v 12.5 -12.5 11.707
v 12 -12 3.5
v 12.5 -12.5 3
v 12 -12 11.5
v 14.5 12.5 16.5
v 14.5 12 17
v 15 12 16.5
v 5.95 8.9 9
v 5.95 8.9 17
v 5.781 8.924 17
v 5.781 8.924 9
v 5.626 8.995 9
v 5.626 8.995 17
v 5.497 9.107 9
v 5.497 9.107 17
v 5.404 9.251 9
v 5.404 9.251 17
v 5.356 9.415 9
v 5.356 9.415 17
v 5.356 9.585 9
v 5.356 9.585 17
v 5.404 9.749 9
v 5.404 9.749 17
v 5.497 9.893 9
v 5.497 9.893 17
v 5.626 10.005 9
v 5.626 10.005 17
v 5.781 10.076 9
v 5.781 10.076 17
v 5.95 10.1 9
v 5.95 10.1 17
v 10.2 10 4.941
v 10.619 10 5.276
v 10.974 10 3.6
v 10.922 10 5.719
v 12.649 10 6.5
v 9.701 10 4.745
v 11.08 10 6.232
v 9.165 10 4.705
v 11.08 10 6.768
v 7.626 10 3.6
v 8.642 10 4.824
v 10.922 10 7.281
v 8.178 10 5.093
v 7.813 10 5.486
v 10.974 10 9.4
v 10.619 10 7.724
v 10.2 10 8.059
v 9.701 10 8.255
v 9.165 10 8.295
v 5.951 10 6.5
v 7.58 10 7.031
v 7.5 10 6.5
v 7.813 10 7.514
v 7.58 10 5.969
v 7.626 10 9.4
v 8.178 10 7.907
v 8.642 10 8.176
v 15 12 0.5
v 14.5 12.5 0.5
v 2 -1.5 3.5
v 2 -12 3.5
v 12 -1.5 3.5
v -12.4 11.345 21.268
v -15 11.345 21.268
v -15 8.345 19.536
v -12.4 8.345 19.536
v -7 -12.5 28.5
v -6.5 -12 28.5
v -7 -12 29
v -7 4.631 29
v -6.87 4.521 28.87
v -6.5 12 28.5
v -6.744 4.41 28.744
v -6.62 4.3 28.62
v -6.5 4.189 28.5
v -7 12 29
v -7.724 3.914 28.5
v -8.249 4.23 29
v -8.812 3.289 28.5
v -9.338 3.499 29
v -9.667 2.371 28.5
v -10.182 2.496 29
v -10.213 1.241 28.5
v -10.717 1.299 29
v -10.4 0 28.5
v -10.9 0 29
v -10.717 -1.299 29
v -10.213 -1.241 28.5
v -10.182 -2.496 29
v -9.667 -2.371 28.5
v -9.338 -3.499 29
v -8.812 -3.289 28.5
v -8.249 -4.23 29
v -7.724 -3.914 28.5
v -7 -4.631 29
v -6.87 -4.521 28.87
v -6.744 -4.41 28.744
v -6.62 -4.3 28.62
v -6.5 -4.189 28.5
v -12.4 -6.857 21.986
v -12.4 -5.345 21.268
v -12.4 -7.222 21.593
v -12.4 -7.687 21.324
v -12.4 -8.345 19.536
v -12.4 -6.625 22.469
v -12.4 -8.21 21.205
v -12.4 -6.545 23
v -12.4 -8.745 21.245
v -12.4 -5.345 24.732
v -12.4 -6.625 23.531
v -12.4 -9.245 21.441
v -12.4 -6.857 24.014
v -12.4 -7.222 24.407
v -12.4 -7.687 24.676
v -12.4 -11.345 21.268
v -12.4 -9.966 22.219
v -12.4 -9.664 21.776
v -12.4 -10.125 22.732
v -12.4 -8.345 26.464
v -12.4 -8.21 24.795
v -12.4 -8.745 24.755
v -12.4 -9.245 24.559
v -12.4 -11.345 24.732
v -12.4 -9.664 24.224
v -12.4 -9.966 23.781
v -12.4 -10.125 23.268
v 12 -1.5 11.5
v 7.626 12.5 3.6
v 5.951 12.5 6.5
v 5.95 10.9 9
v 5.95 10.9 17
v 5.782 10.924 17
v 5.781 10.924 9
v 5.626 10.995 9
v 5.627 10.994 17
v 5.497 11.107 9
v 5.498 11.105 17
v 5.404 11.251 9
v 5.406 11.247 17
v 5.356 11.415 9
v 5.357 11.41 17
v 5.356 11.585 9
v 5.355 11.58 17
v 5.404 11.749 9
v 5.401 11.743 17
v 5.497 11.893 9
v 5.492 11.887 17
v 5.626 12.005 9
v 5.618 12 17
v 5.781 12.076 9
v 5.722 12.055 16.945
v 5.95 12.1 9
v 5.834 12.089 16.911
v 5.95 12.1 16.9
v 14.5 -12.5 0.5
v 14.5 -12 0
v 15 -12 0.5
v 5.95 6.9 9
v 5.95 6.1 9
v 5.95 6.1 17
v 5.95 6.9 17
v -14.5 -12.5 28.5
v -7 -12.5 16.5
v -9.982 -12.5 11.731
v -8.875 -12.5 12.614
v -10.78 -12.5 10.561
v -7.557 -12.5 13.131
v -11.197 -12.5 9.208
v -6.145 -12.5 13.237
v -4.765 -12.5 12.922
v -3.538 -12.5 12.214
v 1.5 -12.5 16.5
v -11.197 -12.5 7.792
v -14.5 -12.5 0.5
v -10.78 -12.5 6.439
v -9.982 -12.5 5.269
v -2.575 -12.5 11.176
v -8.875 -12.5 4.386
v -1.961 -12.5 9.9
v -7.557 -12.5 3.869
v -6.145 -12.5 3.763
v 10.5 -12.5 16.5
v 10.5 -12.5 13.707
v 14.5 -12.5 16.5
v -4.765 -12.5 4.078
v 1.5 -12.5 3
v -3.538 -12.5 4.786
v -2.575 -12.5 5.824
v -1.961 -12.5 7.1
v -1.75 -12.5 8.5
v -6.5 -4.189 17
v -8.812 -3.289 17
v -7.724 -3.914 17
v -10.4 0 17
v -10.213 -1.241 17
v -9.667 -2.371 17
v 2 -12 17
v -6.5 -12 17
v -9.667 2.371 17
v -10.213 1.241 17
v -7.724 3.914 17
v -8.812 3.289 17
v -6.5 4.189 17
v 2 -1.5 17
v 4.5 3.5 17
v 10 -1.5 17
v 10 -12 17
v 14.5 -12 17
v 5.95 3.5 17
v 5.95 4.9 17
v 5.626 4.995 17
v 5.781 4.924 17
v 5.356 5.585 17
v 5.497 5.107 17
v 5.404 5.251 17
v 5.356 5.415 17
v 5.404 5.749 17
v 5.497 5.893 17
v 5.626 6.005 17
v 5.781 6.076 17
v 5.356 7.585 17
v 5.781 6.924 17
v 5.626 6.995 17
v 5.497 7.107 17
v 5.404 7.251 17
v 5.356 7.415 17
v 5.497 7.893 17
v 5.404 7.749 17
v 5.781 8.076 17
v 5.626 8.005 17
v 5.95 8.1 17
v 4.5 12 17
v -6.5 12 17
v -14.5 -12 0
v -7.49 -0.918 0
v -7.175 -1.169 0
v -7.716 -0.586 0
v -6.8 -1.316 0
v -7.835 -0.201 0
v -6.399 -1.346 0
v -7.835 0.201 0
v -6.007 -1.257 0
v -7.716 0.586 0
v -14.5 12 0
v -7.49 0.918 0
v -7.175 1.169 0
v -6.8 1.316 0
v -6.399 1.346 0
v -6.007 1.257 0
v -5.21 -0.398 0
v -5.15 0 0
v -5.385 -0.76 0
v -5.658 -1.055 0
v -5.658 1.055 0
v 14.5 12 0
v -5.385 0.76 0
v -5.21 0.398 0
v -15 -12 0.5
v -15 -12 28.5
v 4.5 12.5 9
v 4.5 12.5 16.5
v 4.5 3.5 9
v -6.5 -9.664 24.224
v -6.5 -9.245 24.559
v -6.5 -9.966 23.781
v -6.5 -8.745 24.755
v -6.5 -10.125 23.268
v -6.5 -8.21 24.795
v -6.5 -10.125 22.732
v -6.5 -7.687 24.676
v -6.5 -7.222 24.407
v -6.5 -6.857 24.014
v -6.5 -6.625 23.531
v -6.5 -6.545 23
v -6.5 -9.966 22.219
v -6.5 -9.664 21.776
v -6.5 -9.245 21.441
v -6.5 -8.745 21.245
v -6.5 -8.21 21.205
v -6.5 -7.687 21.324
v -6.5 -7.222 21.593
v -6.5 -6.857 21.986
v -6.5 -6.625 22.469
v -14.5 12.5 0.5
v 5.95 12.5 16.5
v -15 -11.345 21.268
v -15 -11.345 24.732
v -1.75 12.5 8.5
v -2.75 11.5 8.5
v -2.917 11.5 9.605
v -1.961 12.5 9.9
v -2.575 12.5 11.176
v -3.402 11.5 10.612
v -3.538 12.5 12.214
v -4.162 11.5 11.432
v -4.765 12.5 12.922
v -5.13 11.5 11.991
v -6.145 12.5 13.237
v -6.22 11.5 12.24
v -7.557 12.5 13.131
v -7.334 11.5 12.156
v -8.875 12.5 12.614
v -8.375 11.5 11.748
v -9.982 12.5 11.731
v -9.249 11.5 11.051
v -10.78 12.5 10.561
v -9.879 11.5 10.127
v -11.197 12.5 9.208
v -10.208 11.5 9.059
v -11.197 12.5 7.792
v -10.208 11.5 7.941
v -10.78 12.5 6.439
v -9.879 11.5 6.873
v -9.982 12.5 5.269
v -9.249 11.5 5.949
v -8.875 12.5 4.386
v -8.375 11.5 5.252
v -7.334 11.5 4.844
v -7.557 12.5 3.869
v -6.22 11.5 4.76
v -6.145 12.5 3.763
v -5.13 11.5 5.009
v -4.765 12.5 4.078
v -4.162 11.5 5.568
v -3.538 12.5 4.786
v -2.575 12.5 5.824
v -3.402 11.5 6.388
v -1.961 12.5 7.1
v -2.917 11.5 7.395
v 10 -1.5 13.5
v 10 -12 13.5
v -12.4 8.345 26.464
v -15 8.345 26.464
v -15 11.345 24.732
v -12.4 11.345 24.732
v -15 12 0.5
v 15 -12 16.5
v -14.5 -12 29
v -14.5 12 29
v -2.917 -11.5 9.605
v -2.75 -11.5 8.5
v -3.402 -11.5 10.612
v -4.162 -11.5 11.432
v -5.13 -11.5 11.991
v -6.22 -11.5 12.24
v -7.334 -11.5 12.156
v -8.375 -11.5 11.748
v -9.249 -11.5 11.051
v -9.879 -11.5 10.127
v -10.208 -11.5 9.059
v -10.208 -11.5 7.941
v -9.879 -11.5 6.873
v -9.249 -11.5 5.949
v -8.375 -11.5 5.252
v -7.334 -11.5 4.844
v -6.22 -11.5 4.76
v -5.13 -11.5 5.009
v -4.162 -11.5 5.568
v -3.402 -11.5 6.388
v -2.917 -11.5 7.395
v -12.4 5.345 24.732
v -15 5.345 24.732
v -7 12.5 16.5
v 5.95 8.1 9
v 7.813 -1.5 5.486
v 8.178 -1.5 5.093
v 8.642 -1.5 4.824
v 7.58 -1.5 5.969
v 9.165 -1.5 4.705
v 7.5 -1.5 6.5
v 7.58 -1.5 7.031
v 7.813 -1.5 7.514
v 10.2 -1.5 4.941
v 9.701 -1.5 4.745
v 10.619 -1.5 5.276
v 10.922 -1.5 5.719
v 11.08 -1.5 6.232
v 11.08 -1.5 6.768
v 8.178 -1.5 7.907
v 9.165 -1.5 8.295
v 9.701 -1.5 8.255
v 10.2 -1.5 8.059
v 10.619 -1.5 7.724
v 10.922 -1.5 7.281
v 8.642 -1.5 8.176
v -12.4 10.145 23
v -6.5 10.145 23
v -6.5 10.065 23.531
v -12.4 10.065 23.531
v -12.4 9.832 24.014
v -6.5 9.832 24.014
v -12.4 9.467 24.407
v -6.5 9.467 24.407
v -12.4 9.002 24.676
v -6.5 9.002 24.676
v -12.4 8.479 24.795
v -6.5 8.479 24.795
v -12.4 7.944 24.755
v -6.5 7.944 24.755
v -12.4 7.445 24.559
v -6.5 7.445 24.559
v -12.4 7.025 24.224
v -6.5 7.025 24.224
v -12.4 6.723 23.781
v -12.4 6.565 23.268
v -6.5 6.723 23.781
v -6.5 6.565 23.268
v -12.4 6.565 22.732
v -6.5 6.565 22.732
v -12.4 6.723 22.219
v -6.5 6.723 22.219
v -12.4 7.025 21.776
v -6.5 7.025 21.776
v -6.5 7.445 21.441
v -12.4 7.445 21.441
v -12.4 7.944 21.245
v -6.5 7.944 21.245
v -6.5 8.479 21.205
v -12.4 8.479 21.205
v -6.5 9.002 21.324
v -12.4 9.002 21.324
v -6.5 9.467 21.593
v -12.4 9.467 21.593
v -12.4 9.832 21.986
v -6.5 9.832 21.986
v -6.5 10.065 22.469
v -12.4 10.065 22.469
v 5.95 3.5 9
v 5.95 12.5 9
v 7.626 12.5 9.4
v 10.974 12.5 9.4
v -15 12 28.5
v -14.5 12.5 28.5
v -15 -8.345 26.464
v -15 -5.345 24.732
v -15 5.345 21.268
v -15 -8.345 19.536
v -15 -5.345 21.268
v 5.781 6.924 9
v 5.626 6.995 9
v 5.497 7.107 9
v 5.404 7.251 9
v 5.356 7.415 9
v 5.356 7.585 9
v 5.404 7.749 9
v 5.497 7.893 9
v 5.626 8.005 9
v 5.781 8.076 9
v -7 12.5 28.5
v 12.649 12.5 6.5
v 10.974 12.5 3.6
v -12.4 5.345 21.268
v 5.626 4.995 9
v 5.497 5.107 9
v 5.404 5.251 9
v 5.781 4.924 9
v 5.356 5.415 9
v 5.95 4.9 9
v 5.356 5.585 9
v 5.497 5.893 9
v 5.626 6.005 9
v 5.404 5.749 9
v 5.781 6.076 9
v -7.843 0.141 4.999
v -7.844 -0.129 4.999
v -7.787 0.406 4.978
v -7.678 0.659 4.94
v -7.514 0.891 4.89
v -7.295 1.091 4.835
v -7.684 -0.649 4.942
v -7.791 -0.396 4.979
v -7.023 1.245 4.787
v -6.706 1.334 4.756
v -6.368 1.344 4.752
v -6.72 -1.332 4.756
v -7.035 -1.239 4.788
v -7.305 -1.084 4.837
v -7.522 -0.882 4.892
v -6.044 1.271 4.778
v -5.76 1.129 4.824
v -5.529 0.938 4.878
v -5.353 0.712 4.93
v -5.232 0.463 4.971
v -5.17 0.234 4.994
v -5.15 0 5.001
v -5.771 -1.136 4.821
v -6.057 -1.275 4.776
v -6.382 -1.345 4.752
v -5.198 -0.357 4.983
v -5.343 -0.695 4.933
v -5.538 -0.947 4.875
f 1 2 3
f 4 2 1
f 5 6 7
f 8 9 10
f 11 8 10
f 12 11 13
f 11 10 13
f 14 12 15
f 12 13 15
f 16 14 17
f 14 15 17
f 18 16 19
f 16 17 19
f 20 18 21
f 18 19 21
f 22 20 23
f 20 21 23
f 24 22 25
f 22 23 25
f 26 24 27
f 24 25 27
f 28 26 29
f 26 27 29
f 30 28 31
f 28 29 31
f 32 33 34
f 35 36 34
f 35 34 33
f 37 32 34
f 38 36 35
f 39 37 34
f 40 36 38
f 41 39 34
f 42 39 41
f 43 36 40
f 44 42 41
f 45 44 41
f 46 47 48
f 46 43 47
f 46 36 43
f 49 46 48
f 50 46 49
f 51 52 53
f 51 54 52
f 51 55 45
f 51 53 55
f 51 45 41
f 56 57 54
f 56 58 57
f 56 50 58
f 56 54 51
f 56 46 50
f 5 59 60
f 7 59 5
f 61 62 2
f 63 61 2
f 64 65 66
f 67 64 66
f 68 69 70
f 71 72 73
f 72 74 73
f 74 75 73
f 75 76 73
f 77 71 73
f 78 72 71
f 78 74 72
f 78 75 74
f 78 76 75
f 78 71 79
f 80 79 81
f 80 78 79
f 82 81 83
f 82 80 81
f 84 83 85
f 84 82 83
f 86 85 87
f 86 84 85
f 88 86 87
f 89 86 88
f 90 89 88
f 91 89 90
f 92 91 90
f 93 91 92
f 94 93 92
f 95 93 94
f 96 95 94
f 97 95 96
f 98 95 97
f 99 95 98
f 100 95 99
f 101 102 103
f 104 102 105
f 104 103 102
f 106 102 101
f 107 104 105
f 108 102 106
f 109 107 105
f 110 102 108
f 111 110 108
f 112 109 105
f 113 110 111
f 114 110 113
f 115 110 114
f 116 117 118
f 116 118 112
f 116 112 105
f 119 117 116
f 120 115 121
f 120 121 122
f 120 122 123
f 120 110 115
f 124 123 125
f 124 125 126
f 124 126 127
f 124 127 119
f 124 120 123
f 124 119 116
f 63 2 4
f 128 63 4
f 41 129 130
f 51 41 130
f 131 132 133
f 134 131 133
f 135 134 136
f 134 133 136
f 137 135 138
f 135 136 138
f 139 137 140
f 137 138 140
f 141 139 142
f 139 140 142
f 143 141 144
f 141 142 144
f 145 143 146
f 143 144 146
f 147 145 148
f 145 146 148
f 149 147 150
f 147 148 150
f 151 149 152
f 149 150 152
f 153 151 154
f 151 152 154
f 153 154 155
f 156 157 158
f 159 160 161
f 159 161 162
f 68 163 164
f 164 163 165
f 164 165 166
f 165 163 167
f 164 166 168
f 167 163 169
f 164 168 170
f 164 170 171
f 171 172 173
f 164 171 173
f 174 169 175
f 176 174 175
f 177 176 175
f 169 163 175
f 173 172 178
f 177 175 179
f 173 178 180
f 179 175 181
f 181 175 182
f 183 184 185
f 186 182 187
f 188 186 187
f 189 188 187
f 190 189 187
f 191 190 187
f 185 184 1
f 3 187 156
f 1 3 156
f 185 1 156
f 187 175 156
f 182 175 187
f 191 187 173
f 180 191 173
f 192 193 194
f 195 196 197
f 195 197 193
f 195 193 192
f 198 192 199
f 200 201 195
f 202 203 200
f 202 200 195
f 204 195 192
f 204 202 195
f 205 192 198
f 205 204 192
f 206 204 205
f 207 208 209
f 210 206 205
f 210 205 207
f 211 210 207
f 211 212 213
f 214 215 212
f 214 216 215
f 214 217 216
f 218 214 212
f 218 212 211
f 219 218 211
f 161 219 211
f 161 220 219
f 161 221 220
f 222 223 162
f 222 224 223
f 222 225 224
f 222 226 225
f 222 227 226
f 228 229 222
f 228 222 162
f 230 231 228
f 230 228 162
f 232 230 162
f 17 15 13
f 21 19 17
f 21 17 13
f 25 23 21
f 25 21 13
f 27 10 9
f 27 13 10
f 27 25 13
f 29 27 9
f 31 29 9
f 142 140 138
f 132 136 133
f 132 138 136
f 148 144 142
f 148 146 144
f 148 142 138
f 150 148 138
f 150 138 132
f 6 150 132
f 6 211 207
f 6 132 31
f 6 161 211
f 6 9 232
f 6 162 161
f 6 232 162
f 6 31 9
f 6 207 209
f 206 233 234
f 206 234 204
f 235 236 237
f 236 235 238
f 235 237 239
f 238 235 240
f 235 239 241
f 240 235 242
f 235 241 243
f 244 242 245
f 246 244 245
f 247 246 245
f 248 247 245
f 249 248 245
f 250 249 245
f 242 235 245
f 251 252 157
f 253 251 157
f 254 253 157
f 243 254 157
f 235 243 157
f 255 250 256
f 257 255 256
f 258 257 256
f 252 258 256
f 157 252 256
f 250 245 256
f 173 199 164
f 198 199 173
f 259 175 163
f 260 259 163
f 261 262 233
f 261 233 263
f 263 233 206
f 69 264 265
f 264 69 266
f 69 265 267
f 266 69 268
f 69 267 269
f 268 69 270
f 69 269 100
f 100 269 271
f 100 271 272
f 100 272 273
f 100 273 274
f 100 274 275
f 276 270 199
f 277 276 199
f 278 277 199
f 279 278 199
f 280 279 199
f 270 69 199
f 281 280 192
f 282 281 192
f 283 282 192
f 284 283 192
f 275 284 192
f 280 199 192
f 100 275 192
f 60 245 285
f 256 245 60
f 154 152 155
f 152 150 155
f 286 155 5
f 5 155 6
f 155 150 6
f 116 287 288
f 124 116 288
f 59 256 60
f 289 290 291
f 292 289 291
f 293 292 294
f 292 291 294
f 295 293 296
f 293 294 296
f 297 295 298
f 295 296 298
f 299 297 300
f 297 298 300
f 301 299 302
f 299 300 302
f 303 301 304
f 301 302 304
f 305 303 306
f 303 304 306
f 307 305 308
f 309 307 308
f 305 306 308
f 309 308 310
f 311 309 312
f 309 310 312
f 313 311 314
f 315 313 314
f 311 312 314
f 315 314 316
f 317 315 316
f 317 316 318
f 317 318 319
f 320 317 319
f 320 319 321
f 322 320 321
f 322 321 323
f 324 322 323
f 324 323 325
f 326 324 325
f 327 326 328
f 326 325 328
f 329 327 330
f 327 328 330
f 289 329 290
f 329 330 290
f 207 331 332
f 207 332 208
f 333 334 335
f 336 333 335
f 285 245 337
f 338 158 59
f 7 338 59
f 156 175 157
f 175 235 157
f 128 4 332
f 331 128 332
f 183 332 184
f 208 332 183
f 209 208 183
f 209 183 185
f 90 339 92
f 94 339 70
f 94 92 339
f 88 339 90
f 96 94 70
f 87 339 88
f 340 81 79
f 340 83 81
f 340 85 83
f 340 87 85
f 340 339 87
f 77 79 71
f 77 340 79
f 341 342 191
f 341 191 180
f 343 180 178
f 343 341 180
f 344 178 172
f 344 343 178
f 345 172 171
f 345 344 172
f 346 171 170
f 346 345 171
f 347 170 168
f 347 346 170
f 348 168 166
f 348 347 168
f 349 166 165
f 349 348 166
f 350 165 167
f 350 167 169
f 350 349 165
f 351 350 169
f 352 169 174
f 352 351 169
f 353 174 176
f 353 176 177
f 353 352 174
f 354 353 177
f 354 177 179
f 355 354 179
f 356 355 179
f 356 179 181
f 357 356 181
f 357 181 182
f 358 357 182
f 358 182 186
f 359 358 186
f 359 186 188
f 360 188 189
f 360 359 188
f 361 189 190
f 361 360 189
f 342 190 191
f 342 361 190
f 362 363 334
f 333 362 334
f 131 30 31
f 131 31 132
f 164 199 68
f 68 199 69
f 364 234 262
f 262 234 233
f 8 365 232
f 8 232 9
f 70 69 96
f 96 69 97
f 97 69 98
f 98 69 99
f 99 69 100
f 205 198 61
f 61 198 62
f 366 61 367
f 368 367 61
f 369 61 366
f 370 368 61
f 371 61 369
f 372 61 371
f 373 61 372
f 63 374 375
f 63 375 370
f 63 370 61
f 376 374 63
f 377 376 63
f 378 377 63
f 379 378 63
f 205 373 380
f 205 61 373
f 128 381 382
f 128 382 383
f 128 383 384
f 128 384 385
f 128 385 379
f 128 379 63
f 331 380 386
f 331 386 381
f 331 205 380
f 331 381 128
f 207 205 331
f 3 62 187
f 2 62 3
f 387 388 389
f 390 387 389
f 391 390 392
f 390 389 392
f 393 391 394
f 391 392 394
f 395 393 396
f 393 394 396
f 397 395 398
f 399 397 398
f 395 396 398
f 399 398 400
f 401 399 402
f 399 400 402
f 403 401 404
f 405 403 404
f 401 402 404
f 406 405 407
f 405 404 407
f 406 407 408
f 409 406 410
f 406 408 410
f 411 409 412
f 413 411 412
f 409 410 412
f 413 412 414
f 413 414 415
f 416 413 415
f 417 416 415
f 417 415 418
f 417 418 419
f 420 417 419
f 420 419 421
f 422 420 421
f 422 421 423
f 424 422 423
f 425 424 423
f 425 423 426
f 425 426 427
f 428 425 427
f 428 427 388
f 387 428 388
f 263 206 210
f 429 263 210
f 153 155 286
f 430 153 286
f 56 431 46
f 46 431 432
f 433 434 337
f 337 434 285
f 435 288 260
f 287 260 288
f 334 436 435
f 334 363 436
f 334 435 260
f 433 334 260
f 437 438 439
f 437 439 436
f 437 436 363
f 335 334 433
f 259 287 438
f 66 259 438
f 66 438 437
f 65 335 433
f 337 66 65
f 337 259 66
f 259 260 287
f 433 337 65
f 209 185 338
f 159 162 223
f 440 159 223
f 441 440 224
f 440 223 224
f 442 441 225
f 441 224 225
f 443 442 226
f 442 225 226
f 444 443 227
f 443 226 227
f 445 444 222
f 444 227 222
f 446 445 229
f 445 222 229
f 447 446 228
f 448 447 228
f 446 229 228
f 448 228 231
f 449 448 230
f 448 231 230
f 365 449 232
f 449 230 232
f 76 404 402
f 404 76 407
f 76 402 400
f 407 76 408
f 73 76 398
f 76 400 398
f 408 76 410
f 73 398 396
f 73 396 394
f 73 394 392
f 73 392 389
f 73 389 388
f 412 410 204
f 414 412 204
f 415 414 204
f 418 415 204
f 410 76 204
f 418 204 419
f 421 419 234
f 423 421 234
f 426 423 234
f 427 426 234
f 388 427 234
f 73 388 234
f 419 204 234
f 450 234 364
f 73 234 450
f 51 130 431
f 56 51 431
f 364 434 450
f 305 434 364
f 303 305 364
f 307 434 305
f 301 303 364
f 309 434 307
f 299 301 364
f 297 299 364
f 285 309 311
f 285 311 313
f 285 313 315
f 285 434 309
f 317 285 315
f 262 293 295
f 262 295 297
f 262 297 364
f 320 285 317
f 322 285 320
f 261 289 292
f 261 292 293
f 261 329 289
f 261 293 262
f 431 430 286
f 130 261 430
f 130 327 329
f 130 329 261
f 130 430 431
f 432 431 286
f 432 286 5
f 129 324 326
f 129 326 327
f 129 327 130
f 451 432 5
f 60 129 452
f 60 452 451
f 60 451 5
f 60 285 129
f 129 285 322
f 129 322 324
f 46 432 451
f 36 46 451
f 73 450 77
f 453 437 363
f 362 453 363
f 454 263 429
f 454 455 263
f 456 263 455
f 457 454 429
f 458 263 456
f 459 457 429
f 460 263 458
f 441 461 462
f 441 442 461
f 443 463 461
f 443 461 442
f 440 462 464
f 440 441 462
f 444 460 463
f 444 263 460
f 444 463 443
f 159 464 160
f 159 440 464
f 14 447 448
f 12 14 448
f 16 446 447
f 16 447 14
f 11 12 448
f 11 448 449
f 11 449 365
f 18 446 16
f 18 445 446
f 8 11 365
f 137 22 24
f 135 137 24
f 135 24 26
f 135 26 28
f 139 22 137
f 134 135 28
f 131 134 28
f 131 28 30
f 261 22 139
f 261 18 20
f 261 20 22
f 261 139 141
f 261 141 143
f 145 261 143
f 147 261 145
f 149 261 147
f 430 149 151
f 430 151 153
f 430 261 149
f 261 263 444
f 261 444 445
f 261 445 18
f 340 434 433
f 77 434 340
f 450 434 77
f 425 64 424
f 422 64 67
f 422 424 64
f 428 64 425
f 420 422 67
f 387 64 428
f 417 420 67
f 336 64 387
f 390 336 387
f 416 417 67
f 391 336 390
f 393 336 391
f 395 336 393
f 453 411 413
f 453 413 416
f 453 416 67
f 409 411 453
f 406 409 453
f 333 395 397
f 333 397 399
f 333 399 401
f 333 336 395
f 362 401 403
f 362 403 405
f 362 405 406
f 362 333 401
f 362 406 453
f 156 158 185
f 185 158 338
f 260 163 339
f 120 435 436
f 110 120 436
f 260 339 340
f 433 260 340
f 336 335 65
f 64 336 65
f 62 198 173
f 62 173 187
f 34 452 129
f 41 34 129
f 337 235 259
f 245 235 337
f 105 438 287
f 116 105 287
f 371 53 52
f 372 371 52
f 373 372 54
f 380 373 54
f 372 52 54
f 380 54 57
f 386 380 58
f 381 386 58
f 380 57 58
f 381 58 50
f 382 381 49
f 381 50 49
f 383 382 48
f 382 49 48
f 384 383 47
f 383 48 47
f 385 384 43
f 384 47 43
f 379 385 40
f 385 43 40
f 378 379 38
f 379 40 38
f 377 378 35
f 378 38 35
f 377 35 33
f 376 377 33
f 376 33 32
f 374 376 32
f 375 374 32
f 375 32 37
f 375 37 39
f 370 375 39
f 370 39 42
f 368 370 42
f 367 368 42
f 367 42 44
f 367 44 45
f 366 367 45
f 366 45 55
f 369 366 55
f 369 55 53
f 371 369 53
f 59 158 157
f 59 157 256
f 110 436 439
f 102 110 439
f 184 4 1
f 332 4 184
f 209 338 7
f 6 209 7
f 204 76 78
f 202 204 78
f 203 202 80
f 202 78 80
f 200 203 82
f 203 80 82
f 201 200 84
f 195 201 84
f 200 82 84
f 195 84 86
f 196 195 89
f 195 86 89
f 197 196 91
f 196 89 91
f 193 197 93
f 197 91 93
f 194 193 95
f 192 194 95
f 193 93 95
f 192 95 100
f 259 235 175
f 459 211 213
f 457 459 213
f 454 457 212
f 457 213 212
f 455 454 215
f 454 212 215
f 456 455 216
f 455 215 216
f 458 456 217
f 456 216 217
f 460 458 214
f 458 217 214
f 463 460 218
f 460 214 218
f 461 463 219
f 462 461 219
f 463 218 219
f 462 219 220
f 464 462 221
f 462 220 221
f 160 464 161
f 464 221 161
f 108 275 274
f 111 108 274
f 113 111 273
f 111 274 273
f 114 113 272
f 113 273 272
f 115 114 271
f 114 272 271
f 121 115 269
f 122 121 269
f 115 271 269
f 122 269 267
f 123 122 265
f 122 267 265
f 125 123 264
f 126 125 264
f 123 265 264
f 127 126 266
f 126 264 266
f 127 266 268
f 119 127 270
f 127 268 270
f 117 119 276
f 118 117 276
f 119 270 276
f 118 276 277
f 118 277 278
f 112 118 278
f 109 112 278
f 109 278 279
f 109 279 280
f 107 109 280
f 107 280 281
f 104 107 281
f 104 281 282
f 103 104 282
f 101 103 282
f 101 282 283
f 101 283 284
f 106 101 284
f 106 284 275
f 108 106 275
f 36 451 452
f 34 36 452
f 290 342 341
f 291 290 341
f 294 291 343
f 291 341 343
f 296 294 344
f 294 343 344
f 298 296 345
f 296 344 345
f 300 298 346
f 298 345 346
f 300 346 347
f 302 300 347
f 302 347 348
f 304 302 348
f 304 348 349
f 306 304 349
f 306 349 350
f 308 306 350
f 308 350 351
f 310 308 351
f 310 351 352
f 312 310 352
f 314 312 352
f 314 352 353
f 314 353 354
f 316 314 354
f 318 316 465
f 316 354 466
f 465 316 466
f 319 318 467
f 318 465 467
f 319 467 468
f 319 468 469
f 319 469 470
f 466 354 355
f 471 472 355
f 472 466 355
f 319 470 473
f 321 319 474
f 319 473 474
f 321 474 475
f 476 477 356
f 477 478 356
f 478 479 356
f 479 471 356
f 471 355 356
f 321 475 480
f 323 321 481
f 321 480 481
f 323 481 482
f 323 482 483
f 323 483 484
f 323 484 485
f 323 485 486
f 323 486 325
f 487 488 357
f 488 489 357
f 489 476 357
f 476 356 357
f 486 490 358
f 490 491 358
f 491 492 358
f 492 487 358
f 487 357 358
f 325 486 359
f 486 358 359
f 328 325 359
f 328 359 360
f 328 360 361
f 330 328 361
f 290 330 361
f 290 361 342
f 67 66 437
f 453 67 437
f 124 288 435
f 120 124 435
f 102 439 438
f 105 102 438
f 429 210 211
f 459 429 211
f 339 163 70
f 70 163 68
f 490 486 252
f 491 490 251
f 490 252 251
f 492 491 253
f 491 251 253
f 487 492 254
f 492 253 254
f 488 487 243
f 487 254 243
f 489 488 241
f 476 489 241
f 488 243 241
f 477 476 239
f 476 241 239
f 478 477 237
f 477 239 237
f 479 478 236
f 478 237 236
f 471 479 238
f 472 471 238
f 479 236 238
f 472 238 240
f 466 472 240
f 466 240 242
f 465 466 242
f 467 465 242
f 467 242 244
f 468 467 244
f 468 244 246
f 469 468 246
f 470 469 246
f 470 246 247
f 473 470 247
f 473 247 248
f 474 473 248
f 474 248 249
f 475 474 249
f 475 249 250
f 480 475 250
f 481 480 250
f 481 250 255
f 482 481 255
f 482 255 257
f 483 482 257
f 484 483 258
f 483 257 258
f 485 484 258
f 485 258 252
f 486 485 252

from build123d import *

# Parameters (mm, degrees)
F0_W      = 30
F0_H      = 25
F1_DEPTH  = 17
F3_DEPTH  = 11
F4_R      = 3.75
F5_DEPTH  = 25
F6_W      = 8.5
F6_H      = 25
F7_DEPTH  = 12
F9_DEPTH  = 12
F10_R     = 1.8
F11_DEPTH = 8.5
F12_R     = 1.8
F13_DEPTH = 2.6
F15_DEPTH = 8
F16_R     = 1.8
F17_DEPTH = 14
F18_R     = 1.8
F19_DEPTH = 2.5
F21_SIZE  = 0.5
F22_SIZE2 = 1
F22_SIZE  = 1
F23_R     = 1.35
F24_DEPTH = 5.0024289632


# Not quite as in the source:
# - a feature names something its author has since deleted; it is built from what else it names


with BuildPart() as f1:
    # F0 (on Top) → F1 (new body)
    with BuildSketch(Plane.XY):
        Rectangle(F0_W, F0_H)
    extrude(amount=F1_DEPTH)

    # F2 (on face) → F3 (cut)
    with BuildSketch(Plane.XZ.offset(12.5)):
        Polygon((10, 17), (2, 17), (2, 3.5), (12, 3.5), (12, 11.5), (10, 13.5), align=None)
    extrude(amount=-F3_DEPTH, mode=Mode.SUBTRACT)

    # F4 (on face) → F5 (cut, through all)
    with BuildSketch(Plane.XZ.offset(12.5)):
        with Locations((-6.5, 8.5)):
            Circle(F4_R)
    extrude(amount=-F5_DEPTH, mode=Mode.SUBTRACT)

    # F6 (on face) → F7 (join)
    with BuildSketch(Plane.XY.offset(17)):
        with Locations((-10.75, 0)):
            Rectangle(F6_W, F6_H)
    extrude(amount=F7_DEPTH)

    # F8 (on face) → F9 (cut)
    with BuildSketch(Plane.XY.offset(29)):
        with BuildLine():
            Line((-6.5, -4.1892720131), (-6.5, 4.1892720131))
            ThreePointArc((-6.5, 4.1892720131), (-10.4, 0), (-6.5, -4.1892720131))
        make_face()
    extrude(amount=-F9_DEPTH, mode=Mode.SUBTRACT)

    # F10 (on face) → F11 (cut, through all)
    with BuildSketch(Plane.YZ.offset(-6.5)):
        with Locations((-8.3446360066, 23)):
            Circle(F10_R)
        with Locations((8.3446360066, 23)):
            Circle(F10_R)
    extrude(amount=-F11_DEPTH, mode=Mode.SUBTRACT)

    # F12 (on face) → F13 (cut)
    with BuildSketch(Plane(origin=(-15, 0, 0), x_dir=(0, -1, 0), z_dir=(-1, 0, 0))):
        Polygon((11.3446360067, 21.2679491924), (11.3446360067, 24.7320508076), (8.3446360067, 26.4641016151), (5.3446360067, 24.7320508076), (5.3446360067, 21.2679491924), (8.3446360067, 19.5358983849), align=None)
        with Locations((8.3446360066, 23)):
            Circle(F12_R, mode=Mode.SUBTRACT)
        Polygon((-5.3446360064, 21.2679491924), (-5.3446360064, 24.7320508076), (-8.3446360064, 26.4641016151), (-11.3446360064, 24.7320508076), (-11.3446360064, 21.2679491924), (-8.3446360064, 19.5358983849), align=None)
        with Locations((-8.3446360066, 23)):
            Circle(F12_R, mode=Mode.SUBTRACT)
    extrude(amount=-F13_DEPTH, mode=Mode.SUBTRACT)

    # F14 (on face) → F15 (cut)
    with BuildSketch(Plane.XY.offset(17)):
        with BuildLine():
            Line((5.95, 12.5), (4.5, 12.5))
            Line((4.5, 12.5), (4.5, 3.5))
            Line((4.5, 3.5), (5.95, 3.5))
            Line((5.95, 3.5), (5.95, 4.9))
            ThreePointArc((5.95, 4.9), (5.35, 5.5), (5.95, 6.1))
            Line((5.95, 6.1), (5.95, 6.9))
            ThreePointArc((5.95, 6.9), (5.35, 7.5), (5.95, 8.1))
            Line((5.95, 8.1), (5.95, 8.9))
            ThreePointArc((5.95, 8.9), (5.35, 9.5), (5.95, 10.1))
            Line((5.95, 10.1), (5.95, 10.9))
            ThreePointArc((5.95, 10.9), (5.35, 11.5), (5.95, 12.1))
            Line((5.95, 12.1), (5.95, 12.5))
        make_face()
    extrude(amount=-F15_DEPTH, mode=Mode.SUBTRACT)

    # F16 (on face) → F17 (cut, through all)
    with BuildSketch(Plane(origin=(0, 12.5, 0), x_dir=(-1, 0, 0), z_dir=(0, 1, 0))):
        with Locations((-9.3, 6.5)):
            Circle(F16_R)
    extrude(amount=-F17_DEPTH, mode=Mode.SUBTRACT)

    # F18 (on face) → F19 (cut)
    with BuildSketch(Plane(origin=(0, 12.5, 0), x_dir=(-1, 0, 0), z_dir=(0, 1, 0))):
        Polygon((-7.6256842194, 9.4), (-10.9743157806, 9.4), (-12.6486315613, 6.5), (-10.9743157806, 3.6), (-7.6256842194, 3.6), (-5.9513684387, 6.5), align=None)
        with Locations((-9.3, 6.5)):
            Circle(F18_R, mode=Mode.SUBTRACT)
    extrude(amount=-F19_DEPTH, mode=Mode.SUBTRACT)

    # F21
    f21_edges = [f1.edges().sort_by_distance(p)[0] for p in [
        (0, -12.5, 0),
        (-15, 0, 0),
        (0, 12.5, 0),
        (15, 0, 0),
        (-1, 12.5, 17),
        (10.475, 12.5, 17),
        (-15, 12.5, 14.5),
        (-15, -12.5, 14.5),
        (2, -12.5, 10.25),
        (-6.5, -12.5, 23),
        (7, -12.5, 3.5),
        (12, -12.5, 7.5),
        (11, -12.5, 12.5),
        (10, -12.5, 15.25),
        (15, -12.5, 8.5),
        (12.5, -12.5, 17),
        (15, 0, 17),
        (15, 12.5, 8.5),
        (-6.5, 12.5, 23),
        (-10.75, 12.5, 29),
        (-6.5, 8.344636, 29),
        (-6.5, -8.344636, 29),
        (-10.75, -12.5, 29),
        (-2.25, -12.5, 17),
        (-15, 0, 29),
        (-10.4, 0, 29),
    ]]
    chamfer(f21_edges, length=F21_SIZE)

    # F22
    f22_edges = [f1.edges().sort_by_distance(p)[0] for p in [
        (-2.75, 0, 8.5),
        (-10.25, -12.5, 8.5),
        (-10.25, 12.5, 8.5),
    ]]
    chamfer(f22_edges, length=F22_SIZE, length2=F22_SIZE2)

    # F23 (on face) → F24 (cut, through all)
    with BuildSketch(Plane(origin=(0, 0, 0), x_dir=(1, 0, 0), z_dir=(0, 0, -1))):
        with Locations((-6.5, 0)):
            Circle(F23_R)
    extrude(amount=-F24_DEPTH, mode=Mode.SUBTRACT)


solid = f1.part
